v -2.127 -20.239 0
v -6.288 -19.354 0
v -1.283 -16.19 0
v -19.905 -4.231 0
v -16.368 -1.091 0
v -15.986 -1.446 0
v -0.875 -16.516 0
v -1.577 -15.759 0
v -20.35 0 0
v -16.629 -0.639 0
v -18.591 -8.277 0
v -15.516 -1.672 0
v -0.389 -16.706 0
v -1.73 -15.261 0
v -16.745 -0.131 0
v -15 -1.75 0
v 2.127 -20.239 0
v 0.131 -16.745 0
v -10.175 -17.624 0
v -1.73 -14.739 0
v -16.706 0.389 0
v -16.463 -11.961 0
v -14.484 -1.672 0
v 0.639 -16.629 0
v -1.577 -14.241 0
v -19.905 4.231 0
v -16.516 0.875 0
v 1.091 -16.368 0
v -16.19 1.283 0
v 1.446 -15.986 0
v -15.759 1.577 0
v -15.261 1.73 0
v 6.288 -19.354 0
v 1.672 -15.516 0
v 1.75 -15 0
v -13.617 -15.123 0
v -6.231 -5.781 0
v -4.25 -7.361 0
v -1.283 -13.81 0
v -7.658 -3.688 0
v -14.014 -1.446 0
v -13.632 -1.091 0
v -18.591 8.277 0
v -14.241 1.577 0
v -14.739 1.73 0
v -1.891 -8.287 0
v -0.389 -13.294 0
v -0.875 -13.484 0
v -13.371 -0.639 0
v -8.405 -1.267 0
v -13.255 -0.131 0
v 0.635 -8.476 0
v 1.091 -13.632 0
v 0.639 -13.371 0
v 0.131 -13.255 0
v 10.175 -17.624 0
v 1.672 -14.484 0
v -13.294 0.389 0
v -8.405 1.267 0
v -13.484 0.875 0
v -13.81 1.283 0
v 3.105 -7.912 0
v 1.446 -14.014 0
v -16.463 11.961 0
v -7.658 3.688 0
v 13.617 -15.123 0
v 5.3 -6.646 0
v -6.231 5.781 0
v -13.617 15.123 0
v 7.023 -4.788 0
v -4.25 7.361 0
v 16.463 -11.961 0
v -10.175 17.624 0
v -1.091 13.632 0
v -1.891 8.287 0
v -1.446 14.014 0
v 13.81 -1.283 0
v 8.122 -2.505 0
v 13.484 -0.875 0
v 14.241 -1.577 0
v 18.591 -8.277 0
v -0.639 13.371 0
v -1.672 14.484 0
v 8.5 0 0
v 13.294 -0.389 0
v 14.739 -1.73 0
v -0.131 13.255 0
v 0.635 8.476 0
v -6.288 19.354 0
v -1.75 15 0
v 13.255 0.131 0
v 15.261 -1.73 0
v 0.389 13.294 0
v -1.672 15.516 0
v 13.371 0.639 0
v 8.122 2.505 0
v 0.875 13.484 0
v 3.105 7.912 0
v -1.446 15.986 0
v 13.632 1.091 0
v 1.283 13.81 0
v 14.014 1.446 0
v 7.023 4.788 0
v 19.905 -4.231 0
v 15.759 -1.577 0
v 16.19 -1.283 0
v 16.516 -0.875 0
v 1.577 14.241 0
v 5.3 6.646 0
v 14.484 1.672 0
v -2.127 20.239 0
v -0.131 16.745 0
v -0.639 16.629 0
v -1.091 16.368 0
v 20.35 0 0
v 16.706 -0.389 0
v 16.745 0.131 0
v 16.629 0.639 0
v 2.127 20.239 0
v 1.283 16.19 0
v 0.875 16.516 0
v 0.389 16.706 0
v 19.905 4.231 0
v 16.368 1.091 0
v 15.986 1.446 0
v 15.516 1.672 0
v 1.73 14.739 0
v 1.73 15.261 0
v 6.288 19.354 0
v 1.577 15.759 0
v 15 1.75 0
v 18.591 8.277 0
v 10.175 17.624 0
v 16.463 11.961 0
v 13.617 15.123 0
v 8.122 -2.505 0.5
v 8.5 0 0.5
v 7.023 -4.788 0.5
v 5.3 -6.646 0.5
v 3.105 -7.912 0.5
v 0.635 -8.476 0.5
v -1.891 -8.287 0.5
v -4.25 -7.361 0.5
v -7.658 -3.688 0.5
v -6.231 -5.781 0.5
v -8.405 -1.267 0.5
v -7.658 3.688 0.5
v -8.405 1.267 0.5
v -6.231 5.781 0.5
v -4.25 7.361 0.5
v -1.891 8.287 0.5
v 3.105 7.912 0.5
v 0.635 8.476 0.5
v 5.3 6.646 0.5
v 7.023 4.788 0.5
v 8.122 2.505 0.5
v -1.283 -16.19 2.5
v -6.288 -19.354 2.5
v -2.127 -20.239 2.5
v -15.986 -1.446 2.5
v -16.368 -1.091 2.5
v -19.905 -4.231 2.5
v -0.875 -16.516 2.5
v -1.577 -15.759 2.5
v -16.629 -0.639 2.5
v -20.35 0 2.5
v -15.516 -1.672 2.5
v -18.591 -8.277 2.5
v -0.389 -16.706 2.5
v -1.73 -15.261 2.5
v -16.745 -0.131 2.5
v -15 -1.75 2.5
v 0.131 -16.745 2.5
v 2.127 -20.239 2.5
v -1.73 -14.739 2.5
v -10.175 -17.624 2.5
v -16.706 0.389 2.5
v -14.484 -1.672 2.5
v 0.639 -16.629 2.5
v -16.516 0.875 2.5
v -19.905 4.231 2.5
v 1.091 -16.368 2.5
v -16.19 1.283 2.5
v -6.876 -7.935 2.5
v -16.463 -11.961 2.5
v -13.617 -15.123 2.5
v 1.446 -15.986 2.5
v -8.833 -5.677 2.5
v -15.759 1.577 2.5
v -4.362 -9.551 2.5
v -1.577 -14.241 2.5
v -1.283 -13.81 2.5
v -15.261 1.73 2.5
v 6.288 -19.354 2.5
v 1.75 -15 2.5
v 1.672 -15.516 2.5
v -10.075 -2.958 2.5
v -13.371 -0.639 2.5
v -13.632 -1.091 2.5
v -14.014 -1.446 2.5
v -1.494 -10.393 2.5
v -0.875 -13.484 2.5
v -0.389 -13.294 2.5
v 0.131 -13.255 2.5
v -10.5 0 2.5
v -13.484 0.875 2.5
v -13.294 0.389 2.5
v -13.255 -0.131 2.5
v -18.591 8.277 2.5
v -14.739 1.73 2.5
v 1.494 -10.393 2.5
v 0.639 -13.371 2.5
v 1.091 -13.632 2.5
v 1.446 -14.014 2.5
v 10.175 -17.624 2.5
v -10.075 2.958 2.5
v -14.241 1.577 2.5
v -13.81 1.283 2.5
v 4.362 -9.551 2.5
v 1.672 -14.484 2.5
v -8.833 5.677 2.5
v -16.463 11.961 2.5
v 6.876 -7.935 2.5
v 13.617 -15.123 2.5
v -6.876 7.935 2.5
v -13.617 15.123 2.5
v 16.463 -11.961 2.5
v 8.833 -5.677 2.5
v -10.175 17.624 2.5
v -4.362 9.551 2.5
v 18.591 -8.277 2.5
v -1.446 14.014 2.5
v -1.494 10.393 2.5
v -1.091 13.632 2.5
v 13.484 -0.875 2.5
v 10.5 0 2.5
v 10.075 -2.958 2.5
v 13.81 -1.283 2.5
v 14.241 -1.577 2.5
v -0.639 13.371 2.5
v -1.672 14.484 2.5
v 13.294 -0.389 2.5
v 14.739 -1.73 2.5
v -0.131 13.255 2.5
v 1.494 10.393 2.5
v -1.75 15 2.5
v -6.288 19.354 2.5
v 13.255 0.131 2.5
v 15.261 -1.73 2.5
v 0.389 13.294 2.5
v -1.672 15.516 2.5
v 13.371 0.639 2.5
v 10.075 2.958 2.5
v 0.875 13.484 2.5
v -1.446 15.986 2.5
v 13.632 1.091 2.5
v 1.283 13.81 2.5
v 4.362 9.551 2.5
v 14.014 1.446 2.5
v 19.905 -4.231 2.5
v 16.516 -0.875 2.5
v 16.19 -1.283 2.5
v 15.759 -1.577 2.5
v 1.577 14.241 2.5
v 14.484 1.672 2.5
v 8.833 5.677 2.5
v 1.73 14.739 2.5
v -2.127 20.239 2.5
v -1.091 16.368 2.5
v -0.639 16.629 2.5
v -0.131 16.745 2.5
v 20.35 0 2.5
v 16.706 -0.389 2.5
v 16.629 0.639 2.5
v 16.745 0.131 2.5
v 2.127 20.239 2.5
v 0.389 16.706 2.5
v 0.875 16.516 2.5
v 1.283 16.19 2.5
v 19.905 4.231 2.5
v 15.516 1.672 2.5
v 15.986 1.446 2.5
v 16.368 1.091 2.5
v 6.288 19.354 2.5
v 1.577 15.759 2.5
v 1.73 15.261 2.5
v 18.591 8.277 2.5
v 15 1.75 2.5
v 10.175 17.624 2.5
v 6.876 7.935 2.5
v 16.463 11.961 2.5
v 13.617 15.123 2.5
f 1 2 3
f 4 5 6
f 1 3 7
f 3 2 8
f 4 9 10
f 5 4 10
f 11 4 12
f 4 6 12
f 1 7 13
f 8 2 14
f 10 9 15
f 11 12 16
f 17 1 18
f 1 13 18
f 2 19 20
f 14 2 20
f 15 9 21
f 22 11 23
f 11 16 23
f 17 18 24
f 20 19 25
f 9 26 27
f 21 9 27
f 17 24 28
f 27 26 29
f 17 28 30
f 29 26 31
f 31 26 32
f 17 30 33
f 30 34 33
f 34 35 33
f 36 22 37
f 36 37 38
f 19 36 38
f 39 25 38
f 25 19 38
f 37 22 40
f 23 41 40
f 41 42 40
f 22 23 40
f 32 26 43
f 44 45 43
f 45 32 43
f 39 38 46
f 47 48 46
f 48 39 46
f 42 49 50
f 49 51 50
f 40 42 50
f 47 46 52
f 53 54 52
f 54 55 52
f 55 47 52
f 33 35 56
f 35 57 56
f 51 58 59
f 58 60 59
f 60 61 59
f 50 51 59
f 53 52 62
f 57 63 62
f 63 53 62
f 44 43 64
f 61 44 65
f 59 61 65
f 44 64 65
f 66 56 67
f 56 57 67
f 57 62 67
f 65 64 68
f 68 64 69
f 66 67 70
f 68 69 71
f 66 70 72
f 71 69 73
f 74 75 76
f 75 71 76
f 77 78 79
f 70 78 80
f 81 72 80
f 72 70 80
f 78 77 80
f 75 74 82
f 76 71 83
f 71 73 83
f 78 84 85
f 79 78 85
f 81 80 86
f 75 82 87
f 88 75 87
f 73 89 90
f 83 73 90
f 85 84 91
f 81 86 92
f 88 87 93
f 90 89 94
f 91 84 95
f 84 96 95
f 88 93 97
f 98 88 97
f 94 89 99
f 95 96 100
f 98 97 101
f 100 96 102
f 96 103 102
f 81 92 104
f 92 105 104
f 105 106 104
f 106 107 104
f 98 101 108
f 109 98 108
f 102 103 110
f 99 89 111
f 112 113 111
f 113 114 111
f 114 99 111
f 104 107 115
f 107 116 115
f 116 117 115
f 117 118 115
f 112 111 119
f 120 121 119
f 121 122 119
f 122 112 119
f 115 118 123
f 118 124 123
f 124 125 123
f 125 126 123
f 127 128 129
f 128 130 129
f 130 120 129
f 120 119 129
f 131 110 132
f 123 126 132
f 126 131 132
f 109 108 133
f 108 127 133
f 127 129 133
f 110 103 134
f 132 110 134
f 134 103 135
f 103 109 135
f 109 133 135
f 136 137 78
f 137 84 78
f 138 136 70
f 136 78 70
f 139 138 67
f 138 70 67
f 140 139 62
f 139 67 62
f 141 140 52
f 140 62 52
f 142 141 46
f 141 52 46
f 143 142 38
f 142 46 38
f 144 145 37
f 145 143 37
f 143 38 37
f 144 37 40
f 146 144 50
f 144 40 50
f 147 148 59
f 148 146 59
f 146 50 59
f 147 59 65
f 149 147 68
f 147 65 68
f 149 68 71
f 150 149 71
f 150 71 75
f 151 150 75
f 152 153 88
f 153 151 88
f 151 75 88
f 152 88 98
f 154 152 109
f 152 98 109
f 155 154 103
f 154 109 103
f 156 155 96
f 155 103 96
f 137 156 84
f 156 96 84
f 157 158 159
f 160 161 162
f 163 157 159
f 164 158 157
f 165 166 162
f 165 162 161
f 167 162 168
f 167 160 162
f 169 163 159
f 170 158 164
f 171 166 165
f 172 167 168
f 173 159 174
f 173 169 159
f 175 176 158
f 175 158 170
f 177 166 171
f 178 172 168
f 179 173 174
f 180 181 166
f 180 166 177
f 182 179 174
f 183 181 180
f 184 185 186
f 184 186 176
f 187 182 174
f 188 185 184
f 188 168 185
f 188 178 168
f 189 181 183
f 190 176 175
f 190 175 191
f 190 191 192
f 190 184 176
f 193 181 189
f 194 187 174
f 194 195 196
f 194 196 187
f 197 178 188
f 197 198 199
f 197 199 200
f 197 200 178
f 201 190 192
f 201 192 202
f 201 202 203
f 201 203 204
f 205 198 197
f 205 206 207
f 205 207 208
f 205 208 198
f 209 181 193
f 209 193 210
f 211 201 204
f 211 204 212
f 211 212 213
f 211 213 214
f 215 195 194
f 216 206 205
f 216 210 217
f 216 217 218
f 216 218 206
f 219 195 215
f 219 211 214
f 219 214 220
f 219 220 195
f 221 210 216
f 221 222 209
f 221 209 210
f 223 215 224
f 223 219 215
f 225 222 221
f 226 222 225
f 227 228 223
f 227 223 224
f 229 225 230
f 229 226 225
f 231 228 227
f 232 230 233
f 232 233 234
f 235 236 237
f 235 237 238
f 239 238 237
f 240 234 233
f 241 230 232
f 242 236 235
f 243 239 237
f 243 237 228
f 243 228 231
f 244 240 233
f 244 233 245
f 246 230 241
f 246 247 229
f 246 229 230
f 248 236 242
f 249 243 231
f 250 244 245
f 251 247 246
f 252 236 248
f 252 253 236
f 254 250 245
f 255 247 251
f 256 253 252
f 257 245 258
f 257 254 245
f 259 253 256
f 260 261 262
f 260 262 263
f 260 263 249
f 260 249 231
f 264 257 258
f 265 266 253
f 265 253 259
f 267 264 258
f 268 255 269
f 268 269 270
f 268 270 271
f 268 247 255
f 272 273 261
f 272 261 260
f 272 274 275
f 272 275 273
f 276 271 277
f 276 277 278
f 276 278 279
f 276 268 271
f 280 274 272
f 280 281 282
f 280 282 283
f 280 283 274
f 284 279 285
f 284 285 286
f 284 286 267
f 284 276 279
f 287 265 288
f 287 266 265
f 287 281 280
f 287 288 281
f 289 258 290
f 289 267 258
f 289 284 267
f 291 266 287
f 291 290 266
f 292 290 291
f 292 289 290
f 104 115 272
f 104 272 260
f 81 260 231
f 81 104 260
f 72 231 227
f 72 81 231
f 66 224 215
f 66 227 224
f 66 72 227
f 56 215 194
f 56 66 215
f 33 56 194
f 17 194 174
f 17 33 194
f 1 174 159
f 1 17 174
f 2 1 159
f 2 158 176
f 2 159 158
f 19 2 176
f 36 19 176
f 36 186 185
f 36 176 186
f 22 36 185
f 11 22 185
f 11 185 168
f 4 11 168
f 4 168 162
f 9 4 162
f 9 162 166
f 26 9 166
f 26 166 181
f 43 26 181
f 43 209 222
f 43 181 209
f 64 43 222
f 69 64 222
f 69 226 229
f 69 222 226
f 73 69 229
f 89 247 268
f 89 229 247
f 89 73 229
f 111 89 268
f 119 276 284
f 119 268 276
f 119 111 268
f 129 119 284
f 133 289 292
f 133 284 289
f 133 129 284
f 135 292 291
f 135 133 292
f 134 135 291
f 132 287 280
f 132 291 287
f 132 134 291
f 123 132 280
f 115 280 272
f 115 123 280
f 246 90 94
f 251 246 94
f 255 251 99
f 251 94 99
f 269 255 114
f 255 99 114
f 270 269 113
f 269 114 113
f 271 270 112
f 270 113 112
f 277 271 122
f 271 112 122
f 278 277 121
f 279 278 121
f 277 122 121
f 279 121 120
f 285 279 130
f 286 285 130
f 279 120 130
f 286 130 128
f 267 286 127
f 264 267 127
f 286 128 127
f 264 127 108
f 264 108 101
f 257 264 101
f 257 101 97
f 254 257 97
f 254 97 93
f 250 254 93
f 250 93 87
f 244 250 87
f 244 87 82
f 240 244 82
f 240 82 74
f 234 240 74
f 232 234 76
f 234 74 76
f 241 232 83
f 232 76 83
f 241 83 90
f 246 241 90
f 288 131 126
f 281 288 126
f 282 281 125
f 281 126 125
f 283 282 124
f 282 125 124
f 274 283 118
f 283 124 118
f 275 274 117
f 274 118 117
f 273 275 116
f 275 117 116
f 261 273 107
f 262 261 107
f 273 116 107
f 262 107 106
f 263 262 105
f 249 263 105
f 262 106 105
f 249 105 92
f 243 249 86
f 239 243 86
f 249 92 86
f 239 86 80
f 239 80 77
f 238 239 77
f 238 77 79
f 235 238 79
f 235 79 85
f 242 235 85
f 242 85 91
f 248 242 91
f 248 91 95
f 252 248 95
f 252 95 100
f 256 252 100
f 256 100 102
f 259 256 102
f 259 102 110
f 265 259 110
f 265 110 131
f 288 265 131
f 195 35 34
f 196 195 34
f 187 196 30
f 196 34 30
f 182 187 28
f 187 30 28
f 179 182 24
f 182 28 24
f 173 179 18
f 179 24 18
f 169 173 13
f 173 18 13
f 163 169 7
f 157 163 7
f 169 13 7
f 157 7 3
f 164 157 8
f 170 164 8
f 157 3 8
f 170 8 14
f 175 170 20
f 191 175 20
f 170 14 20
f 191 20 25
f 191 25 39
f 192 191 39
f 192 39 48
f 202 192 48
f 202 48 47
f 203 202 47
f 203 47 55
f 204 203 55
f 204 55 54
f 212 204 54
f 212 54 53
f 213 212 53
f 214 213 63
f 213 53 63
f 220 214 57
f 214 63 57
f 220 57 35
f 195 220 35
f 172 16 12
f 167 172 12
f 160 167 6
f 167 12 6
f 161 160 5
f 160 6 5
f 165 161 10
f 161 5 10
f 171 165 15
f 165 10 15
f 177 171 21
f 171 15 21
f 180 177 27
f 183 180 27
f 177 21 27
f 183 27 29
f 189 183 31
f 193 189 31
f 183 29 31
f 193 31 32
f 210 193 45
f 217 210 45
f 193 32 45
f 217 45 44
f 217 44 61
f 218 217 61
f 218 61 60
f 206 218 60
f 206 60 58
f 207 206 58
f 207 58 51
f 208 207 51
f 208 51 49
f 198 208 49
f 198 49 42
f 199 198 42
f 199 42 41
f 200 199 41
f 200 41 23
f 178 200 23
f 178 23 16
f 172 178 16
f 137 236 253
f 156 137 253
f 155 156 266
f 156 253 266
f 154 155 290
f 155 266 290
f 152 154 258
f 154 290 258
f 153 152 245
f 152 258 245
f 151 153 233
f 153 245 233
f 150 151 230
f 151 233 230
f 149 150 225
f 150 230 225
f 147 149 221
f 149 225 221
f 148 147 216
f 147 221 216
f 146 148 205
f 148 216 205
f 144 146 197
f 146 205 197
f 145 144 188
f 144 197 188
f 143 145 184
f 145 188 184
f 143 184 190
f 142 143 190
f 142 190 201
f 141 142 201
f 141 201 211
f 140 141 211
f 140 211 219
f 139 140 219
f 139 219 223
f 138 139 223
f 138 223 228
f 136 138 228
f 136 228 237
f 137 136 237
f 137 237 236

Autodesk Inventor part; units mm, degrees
ref_plane "YZ Plane" through (0, 0, 0) normal (1, 0, 0) x (0, 1, 0)
ref_plane "XZ Plane" through (0, 0, 0) normal (0, 1, 0) x (-1, 0, 0)
ref_plane "XY Plane" through (0, 0, 0) normal (0, 0, 1) x (1, 0, 0)
sketch "スケッチ1" plane through (0, 0, 0) normal (0, 0, 1) x (1, 0, 0)
  circle A0 centre (0, 0) radius 20.35
  circle A1 centre (0, 0) radius 8.5
  dimension "d0" = 40.7
  dimension "d1" = 17
extrude "押し出し1" add sketch "スケッチ1" along normal blind 2.5
sketch "スケッチ2" plane through (0, 0, 0) normal (0, 0, -1) x (-1, 0, 0)
  circle A0 centre (0, 15) radius 1.75
  line L0 (0, -28.49) -> (0, 28.49) projected
  point P0 (0, 0)
  dimension "d4" = 15
  dimension "d5" = 3.5
extrude "押し出し2" cut sketch "スケッチ2" against normal blind 5
pattern_circular "円形状パターン1" count 4 over 360 about axis through (0, 0, -10) along (0, 0, 1) of "押し出し2"
chamfer "面取り1" distance 2 angle 45 1 edges at (-8.5, 0, 2.5)
properties part number "bar2"
